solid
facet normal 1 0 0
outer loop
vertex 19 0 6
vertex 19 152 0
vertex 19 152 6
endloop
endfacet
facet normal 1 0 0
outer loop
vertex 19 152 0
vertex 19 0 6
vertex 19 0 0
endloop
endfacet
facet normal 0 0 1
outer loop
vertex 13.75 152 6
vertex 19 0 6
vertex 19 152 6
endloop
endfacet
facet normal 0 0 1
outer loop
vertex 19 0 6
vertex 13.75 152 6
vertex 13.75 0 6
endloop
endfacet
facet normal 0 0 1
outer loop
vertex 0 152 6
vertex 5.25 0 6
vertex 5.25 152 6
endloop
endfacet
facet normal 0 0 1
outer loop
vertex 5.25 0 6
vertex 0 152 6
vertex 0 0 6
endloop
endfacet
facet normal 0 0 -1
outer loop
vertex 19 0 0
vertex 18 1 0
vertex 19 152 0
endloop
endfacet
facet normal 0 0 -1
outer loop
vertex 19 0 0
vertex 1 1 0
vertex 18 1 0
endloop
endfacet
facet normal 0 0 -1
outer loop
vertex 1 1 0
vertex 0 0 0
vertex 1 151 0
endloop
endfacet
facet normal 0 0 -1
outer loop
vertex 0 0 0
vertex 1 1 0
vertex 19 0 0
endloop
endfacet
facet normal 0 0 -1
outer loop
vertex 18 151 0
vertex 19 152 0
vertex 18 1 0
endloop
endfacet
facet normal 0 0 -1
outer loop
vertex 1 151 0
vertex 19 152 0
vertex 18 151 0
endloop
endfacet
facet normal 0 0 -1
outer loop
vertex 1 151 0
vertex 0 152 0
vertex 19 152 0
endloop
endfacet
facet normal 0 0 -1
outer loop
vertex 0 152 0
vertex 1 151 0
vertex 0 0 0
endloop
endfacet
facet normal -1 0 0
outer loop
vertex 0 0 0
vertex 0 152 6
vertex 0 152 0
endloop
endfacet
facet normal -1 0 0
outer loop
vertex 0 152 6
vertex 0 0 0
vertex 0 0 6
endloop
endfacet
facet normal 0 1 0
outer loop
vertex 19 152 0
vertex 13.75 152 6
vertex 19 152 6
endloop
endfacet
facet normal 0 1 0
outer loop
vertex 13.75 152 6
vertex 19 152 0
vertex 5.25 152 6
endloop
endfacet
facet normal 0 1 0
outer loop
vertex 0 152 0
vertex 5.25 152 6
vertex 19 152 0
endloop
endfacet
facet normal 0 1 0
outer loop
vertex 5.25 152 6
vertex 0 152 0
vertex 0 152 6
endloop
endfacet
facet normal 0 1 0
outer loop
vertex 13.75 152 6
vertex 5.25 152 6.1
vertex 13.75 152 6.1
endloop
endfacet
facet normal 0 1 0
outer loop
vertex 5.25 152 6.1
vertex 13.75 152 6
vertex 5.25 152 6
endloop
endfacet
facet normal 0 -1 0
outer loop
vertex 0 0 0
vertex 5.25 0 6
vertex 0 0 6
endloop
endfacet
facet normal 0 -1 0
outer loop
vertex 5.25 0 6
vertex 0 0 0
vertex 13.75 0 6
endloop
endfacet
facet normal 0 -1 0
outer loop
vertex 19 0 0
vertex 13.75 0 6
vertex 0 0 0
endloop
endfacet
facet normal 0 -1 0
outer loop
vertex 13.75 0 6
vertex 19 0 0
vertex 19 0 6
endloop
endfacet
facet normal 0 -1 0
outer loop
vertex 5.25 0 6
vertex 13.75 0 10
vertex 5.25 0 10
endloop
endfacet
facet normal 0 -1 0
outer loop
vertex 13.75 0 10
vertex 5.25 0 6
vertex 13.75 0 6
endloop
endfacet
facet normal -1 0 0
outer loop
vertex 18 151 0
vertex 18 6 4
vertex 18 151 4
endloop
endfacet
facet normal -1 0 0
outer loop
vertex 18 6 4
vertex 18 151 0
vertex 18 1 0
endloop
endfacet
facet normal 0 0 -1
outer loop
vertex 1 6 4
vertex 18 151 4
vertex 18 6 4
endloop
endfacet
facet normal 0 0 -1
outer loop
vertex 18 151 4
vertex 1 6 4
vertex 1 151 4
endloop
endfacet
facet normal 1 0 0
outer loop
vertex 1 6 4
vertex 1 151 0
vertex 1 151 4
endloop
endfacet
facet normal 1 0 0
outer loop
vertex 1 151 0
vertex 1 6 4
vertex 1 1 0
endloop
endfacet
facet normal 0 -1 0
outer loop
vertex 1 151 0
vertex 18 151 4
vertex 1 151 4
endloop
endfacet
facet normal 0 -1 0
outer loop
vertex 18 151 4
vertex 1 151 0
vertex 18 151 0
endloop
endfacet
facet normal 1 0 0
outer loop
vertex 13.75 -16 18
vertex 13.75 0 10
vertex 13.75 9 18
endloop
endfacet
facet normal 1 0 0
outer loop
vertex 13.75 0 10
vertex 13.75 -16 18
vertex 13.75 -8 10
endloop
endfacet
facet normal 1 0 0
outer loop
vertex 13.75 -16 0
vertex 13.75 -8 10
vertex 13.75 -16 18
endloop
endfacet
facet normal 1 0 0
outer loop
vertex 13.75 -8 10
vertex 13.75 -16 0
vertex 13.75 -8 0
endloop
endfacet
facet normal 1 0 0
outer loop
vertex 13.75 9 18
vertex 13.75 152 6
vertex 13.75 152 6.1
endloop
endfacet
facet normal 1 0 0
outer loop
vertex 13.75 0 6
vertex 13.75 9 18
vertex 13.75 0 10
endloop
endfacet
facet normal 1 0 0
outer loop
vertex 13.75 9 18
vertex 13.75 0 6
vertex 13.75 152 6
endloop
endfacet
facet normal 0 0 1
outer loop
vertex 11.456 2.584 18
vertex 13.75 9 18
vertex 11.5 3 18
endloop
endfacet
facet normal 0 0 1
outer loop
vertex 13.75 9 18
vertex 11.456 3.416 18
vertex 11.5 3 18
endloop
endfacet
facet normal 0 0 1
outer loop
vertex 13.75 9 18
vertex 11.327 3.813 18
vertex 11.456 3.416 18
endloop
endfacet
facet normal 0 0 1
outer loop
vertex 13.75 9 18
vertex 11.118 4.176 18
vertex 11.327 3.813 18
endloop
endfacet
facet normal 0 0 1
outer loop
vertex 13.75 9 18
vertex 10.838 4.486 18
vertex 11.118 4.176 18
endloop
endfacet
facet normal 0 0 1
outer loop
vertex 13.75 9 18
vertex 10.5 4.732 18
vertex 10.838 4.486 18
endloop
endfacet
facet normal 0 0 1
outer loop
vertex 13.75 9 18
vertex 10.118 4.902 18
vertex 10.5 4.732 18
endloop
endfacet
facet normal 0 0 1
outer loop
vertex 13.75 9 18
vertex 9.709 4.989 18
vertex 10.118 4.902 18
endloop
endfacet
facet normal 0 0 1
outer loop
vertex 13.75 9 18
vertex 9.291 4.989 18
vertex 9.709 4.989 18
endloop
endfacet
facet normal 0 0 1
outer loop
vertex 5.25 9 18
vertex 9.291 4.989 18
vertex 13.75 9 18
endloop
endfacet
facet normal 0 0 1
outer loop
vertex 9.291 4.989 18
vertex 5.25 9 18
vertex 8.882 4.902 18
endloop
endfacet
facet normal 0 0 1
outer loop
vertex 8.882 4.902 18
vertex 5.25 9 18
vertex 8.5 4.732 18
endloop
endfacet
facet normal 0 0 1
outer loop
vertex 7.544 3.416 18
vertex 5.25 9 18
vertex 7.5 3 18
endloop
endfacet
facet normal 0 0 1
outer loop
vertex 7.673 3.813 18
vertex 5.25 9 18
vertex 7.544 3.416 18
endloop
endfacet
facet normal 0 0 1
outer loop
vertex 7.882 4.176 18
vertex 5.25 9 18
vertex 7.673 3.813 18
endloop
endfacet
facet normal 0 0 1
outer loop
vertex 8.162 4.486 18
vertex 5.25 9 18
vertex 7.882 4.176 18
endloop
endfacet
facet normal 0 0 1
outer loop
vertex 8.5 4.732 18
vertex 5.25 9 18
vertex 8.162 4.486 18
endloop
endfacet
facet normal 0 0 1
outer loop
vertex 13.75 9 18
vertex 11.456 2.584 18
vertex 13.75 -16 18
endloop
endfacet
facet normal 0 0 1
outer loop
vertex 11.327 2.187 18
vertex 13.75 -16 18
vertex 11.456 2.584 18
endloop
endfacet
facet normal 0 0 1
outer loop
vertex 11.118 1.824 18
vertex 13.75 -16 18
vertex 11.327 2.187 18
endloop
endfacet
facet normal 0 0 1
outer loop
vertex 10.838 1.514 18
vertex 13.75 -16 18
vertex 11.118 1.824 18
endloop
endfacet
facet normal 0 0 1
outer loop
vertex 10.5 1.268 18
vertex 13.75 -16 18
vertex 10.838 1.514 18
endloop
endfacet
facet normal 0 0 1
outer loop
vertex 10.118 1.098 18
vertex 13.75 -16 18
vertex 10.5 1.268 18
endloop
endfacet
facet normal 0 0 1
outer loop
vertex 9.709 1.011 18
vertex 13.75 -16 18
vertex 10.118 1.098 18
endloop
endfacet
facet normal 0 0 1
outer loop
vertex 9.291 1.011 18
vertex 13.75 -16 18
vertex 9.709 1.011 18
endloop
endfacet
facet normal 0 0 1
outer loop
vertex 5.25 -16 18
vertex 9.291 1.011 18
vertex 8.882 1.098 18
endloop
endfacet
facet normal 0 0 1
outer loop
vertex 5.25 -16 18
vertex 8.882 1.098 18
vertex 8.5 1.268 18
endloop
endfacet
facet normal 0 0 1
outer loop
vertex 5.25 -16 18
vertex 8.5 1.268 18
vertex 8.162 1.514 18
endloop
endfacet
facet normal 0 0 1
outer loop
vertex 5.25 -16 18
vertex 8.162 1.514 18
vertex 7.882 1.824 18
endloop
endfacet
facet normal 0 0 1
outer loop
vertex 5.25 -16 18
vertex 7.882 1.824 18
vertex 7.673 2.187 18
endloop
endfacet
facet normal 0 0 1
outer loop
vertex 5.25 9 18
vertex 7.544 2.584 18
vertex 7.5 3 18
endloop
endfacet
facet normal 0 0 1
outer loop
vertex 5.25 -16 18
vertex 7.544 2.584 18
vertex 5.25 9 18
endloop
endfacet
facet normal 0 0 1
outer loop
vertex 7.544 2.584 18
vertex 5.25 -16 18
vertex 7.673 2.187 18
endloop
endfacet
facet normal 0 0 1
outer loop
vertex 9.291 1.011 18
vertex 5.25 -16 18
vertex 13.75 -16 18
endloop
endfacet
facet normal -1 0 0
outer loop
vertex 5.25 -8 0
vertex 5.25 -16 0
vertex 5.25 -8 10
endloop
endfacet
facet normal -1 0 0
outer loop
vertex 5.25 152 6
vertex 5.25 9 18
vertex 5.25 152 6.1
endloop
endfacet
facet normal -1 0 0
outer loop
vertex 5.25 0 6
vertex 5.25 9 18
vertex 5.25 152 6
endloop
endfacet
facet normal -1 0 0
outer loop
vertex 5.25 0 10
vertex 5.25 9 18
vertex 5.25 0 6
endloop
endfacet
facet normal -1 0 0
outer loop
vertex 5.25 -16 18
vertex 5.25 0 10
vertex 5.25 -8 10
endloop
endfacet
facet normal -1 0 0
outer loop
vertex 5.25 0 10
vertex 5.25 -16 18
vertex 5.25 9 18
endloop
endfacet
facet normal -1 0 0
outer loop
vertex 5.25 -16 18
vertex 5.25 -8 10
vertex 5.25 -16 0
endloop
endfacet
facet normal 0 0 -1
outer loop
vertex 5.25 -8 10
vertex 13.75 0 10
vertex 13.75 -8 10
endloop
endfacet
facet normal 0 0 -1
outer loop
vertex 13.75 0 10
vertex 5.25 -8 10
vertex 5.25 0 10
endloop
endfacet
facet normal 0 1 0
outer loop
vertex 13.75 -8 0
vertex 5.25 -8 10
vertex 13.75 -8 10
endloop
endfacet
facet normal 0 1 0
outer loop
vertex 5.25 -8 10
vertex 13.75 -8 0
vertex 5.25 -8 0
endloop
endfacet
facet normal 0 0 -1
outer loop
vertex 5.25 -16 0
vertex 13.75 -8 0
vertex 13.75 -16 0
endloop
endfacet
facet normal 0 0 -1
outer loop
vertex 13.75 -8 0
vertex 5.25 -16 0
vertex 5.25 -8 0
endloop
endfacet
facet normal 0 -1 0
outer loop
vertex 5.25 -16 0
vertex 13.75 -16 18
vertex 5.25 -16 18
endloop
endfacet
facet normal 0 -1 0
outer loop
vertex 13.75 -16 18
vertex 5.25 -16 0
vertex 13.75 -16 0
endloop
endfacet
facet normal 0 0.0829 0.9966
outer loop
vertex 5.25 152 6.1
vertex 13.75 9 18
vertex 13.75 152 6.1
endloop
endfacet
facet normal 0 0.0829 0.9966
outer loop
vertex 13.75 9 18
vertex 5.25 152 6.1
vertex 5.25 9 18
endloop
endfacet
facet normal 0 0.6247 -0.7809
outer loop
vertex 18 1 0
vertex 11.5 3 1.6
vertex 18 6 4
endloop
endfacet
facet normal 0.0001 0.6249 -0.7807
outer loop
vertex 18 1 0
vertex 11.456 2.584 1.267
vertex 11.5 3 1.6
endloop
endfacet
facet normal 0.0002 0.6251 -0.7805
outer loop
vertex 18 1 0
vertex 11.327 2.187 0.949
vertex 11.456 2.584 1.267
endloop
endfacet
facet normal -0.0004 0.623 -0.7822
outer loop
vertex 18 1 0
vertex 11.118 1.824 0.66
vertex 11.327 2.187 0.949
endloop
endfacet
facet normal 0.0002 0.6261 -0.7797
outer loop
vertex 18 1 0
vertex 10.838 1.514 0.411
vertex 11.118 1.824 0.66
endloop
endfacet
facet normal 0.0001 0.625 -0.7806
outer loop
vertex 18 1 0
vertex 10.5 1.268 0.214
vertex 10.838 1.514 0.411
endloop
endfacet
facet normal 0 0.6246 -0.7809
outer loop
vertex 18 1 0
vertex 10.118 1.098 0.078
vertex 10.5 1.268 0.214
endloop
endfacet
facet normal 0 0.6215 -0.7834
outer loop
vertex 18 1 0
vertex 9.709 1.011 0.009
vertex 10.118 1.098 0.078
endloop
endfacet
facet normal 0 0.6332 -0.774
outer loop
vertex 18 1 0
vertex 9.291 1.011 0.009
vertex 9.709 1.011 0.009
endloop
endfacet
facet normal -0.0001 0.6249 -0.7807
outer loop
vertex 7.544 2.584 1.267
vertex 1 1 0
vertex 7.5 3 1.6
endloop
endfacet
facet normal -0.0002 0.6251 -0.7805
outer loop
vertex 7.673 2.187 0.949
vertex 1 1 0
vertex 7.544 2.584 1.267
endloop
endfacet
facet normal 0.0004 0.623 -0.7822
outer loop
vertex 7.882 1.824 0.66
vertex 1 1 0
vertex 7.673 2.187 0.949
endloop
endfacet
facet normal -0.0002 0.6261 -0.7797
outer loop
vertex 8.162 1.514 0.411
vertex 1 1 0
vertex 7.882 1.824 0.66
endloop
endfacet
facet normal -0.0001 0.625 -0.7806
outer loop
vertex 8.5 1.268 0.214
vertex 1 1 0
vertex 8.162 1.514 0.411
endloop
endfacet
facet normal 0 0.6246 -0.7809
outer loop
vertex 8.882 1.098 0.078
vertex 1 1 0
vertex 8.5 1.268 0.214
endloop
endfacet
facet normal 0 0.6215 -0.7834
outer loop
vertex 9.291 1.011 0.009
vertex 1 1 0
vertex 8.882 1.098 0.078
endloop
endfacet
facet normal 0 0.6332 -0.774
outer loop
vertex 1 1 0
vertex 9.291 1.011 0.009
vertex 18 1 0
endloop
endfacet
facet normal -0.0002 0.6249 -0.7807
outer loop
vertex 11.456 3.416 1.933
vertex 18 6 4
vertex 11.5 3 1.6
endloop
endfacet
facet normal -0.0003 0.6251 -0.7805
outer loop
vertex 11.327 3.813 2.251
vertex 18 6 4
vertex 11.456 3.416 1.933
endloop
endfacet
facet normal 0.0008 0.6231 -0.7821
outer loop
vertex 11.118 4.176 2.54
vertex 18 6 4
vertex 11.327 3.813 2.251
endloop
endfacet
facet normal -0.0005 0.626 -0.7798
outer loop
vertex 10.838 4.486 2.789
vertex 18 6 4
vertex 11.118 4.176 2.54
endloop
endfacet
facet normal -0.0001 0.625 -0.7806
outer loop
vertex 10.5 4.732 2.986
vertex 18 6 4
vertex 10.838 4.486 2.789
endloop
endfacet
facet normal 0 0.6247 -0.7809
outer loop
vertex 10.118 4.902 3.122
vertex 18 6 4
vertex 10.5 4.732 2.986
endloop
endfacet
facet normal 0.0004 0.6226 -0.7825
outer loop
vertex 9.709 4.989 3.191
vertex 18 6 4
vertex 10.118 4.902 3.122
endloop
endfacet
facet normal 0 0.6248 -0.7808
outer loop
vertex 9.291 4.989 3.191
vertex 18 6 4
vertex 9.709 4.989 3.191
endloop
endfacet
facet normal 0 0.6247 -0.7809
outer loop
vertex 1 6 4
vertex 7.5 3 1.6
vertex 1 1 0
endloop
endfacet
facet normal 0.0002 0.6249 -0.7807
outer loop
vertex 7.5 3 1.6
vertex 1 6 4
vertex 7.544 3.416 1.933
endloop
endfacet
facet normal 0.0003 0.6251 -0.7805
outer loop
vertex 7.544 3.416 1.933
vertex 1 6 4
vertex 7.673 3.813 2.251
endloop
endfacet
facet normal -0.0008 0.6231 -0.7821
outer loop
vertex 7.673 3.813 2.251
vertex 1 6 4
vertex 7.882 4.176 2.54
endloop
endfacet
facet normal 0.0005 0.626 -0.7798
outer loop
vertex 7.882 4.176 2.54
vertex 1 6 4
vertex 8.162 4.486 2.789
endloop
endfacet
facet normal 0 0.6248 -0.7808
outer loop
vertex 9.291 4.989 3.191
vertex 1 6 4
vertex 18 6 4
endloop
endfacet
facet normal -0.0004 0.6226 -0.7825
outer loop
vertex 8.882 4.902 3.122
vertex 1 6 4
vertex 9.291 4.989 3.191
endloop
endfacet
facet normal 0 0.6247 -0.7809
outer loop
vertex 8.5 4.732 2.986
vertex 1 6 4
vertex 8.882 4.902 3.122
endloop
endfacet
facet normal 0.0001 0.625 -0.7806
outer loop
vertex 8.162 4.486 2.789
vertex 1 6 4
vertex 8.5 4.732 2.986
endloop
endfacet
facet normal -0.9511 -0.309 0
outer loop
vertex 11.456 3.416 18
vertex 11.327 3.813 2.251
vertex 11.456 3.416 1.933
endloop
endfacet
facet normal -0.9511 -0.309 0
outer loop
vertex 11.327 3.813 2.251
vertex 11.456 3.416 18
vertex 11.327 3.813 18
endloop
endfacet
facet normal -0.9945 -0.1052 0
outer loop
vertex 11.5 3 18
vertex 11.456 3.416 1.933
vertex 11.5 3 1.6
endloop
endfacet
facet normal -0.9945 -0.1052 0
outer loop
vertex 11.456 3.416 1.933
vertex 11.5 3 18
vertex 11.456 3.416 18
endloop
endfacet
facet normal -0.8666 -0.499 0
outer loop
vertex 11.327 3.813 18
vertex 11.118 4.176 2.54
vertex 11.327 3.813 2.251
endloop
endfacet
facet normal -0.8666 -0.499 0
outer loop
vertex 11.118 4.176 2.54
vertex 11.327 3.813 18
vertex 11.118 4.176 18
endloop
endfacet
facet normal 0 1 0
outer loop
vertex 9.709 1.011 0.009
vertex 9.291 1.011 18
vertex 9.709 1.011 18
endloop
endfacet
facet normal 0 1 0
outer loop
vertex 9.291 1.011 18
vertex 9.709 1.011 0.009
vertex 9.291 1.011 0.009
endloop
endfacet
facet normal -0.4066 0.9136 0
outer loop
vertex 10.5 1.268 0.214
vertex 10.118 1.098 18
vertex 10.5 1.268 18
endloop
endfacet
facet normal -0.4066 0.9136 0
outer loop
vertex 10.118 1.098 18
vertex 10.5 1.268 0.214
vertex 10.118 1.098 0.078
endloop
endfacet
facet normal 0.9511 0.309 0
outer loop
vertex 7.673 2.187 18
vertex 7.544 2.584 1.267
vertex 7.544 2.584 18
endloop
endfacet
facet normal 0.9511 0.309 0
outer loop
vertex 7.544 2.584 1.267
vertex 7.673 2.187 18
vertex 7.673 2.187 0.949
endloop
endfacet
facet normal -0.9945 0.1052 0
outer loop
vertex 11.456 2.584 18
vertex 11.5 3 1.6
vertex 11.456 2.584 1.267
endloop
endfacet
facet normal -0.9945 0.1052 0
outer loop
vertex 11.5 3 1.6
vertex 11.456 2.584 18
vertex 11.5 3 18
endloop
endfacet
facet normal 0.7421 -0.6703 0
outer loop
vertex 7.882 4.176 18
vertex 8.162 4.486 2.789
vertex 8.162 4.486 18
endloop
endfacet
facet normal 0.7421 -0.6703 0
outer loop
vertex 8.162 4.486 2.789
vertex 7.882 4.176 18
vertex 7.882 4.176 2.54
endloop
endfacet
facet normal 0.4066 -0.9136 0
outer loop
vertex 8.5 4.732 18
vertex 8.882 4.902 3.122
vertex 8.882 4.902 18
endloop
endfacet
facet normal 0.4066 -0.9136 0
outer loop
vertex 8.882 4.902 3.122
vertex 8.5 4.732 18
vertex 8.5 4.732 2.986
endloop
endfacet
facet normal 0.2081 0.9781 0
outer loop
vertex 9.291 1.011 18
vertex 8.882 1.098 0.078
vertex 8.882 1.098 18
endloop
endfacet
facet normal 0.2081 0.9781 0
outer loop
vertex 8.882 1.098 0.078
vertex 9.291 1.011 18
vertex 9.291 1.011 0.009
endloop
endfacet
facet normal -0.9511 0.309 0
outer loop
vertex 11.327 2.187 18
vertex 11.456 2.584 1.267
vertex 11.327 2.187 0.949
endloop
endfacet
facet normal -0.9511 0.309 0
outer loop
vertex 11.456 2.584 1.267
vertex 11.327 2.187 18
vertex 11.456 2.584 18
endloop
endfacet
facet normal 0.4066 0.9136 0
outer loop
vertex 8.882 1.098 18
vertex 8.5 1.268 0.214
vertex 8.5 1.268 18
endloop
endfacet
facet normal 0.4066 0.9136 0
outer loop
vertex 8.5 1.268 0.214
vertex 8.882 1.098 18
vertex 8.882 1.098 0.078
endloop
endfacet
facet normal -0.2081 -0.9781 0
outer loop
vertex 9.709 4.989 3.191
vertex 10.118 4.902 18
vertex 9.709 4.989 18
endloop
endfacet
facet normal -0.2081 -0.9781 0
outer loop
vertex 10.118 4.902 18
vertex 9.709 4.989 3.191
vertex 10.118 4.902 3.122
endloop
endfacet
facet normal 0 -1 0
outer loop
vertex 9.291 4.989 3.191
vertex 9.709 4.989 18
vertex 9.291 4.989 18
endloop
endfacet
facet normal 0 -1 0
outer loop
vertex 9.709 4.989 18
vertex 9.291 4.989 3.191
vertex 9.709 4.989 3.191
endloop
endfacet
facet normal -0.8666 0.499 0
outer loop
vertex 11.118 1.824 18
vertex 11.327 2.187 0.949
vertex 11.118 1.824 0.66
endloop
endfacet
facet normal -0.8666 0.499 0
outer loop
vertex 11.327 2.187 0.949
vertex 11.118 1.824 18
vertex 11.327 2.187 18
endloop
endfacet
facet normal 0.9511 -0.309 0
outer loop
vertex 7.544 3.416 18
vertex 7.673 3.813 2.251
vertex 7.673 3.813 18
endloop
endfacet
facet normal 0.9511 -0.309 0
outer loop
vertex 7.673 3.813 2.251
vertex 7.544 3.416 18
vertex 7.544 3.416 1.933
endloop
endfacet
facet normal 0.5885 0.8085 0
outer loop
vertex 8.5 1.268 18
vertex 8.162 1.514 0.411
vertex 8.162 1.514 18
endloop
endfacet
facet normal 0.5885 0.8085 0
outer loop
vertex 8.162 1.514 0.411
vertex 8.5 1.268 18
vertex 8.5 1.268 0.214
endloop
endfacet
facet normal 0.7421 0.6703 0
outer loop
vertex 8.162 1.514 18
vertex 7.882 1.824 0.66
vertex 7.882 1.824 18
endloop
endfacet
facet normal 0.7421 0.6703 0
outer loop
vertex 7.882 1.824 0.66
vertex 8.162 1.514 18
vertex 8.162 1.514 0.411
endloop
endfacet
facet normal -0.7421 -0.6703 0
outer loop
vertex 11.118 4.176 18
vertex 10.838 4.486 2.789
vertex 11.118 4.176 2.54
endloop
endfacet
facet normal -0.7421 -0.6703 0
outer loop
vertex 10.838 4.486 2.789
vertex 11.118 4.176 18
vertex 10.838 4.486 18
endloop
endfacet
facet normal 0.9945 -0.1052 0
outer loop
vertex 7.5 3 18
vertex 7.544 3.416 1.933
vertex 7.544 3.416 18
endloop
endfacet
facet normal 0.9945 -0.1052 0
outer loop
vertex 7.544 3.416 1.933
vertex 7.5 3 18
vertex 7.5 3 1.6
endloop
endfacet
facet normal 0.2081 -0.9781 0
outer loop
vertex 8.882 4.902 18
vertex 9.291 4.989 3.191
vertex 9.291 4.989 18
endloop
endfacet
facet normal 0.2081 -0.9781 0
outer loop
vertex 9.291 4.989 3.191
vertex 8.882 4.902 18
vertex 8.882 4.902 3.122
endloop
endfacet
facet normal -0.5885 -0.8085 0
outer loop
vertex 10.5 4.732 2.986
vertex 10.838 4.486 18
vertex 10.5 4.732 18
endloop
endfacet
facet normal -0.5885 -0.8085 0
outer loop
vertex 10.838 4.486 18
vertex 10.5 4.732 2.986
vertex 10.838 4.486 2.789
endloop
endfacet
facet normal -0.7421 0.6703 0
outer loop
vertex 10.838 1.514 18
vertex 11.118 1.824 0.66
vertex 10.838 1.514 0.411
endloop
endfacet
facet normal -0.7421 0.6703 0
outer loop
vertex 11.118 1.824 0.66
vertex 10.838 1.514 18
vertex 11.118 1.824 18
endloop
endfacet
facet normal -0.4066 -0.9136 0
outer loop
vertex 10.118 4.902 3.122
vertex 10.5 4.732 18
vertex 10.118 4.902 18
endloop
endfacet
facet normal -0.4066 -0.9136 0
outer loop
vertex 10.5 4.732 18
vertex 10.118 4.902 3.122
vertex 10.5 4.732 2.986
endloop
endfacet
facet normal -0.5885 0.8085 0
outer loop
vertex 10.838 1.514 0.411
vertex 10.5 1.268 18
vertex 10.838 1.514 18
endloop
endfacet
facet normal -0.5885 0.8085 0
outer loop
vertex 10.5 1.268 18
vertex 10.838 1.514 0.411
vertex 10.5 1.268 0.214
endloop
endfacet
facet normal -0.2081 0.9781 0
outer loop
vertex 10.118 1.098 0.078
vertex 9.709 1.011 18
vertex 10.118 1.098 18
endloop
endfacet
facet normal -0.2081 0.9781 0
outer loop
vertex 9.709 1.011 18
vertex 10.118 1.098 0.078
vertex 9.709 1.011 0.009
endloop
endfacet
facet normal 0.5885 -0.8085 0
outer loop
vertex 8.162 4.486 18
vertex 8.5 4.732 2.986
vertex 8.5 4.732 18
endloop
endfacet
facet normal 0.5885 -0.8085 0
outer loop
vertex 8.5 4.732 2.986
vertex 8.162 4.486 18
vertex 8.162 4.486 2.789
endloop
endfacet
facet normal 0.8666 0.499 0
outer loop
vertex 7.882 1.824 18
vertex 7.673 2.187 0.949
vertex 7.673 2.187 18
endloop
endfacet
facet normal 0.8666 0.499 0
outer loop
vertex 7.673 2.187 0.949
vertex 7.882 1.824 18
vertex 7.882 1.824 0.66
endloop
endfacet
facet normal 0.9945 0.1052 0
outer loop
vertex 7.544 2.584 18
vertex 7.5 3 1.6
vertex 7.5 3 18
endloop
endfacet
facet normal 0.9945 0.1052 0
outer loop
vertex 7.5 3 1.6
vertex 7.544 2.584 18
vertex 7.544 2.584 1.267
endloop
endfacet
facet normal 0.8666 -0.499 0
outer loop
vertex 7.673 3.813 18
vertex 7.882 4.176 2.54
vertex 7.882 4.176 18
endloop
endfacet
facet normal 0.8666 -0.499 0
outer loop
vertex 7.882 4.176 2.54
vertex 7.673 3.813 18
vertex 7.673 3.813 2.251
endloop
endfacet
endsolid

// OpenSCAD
led_width = 17;
led_length = 145;

%translate([1,6,0]) cube([led_width,led_length,4]);

total_width = led_width + 2; //2x 1mm walls
total_length = led_length + 2 + 5; //2x 1mm walls + 5mm for wires
mounting_offset = (total_width - led_width/2) / 2;
difference() {

    union() {
        difference() {
            //main body
            cube([total_width,total_length,6]);
    
            //hole for cob
            translate([1,1,-1]) cube([led_width,led_length+5,5]);
        }

        translate([mounting_offset,0,6]) cube([led_width/2,8,12]);
        translate([mounting_offset,-8,10]) cube([led_width/2,8,8]);
        translate([mounting_offset,-16,0]) cube([led_width/2,8,18]);       
        
        hull() {
            translate([mounting_offset,8,6]) cube([led_width/2,1,12]);
            translate([mounting_offset,total_length-1,6]) cube([led_width/2,1,0.1]);
        }
        
        hull() {
            translate([0,0,0]) cube([total_width,1,6]);
            translate([0,5,4]) cube([total_width,1,2]);
        }
        
        
    }
    //hole for wire
    translate([total_width/2,3,-1]) cylinder(r=2, h=20, $fs=0.1);
}
